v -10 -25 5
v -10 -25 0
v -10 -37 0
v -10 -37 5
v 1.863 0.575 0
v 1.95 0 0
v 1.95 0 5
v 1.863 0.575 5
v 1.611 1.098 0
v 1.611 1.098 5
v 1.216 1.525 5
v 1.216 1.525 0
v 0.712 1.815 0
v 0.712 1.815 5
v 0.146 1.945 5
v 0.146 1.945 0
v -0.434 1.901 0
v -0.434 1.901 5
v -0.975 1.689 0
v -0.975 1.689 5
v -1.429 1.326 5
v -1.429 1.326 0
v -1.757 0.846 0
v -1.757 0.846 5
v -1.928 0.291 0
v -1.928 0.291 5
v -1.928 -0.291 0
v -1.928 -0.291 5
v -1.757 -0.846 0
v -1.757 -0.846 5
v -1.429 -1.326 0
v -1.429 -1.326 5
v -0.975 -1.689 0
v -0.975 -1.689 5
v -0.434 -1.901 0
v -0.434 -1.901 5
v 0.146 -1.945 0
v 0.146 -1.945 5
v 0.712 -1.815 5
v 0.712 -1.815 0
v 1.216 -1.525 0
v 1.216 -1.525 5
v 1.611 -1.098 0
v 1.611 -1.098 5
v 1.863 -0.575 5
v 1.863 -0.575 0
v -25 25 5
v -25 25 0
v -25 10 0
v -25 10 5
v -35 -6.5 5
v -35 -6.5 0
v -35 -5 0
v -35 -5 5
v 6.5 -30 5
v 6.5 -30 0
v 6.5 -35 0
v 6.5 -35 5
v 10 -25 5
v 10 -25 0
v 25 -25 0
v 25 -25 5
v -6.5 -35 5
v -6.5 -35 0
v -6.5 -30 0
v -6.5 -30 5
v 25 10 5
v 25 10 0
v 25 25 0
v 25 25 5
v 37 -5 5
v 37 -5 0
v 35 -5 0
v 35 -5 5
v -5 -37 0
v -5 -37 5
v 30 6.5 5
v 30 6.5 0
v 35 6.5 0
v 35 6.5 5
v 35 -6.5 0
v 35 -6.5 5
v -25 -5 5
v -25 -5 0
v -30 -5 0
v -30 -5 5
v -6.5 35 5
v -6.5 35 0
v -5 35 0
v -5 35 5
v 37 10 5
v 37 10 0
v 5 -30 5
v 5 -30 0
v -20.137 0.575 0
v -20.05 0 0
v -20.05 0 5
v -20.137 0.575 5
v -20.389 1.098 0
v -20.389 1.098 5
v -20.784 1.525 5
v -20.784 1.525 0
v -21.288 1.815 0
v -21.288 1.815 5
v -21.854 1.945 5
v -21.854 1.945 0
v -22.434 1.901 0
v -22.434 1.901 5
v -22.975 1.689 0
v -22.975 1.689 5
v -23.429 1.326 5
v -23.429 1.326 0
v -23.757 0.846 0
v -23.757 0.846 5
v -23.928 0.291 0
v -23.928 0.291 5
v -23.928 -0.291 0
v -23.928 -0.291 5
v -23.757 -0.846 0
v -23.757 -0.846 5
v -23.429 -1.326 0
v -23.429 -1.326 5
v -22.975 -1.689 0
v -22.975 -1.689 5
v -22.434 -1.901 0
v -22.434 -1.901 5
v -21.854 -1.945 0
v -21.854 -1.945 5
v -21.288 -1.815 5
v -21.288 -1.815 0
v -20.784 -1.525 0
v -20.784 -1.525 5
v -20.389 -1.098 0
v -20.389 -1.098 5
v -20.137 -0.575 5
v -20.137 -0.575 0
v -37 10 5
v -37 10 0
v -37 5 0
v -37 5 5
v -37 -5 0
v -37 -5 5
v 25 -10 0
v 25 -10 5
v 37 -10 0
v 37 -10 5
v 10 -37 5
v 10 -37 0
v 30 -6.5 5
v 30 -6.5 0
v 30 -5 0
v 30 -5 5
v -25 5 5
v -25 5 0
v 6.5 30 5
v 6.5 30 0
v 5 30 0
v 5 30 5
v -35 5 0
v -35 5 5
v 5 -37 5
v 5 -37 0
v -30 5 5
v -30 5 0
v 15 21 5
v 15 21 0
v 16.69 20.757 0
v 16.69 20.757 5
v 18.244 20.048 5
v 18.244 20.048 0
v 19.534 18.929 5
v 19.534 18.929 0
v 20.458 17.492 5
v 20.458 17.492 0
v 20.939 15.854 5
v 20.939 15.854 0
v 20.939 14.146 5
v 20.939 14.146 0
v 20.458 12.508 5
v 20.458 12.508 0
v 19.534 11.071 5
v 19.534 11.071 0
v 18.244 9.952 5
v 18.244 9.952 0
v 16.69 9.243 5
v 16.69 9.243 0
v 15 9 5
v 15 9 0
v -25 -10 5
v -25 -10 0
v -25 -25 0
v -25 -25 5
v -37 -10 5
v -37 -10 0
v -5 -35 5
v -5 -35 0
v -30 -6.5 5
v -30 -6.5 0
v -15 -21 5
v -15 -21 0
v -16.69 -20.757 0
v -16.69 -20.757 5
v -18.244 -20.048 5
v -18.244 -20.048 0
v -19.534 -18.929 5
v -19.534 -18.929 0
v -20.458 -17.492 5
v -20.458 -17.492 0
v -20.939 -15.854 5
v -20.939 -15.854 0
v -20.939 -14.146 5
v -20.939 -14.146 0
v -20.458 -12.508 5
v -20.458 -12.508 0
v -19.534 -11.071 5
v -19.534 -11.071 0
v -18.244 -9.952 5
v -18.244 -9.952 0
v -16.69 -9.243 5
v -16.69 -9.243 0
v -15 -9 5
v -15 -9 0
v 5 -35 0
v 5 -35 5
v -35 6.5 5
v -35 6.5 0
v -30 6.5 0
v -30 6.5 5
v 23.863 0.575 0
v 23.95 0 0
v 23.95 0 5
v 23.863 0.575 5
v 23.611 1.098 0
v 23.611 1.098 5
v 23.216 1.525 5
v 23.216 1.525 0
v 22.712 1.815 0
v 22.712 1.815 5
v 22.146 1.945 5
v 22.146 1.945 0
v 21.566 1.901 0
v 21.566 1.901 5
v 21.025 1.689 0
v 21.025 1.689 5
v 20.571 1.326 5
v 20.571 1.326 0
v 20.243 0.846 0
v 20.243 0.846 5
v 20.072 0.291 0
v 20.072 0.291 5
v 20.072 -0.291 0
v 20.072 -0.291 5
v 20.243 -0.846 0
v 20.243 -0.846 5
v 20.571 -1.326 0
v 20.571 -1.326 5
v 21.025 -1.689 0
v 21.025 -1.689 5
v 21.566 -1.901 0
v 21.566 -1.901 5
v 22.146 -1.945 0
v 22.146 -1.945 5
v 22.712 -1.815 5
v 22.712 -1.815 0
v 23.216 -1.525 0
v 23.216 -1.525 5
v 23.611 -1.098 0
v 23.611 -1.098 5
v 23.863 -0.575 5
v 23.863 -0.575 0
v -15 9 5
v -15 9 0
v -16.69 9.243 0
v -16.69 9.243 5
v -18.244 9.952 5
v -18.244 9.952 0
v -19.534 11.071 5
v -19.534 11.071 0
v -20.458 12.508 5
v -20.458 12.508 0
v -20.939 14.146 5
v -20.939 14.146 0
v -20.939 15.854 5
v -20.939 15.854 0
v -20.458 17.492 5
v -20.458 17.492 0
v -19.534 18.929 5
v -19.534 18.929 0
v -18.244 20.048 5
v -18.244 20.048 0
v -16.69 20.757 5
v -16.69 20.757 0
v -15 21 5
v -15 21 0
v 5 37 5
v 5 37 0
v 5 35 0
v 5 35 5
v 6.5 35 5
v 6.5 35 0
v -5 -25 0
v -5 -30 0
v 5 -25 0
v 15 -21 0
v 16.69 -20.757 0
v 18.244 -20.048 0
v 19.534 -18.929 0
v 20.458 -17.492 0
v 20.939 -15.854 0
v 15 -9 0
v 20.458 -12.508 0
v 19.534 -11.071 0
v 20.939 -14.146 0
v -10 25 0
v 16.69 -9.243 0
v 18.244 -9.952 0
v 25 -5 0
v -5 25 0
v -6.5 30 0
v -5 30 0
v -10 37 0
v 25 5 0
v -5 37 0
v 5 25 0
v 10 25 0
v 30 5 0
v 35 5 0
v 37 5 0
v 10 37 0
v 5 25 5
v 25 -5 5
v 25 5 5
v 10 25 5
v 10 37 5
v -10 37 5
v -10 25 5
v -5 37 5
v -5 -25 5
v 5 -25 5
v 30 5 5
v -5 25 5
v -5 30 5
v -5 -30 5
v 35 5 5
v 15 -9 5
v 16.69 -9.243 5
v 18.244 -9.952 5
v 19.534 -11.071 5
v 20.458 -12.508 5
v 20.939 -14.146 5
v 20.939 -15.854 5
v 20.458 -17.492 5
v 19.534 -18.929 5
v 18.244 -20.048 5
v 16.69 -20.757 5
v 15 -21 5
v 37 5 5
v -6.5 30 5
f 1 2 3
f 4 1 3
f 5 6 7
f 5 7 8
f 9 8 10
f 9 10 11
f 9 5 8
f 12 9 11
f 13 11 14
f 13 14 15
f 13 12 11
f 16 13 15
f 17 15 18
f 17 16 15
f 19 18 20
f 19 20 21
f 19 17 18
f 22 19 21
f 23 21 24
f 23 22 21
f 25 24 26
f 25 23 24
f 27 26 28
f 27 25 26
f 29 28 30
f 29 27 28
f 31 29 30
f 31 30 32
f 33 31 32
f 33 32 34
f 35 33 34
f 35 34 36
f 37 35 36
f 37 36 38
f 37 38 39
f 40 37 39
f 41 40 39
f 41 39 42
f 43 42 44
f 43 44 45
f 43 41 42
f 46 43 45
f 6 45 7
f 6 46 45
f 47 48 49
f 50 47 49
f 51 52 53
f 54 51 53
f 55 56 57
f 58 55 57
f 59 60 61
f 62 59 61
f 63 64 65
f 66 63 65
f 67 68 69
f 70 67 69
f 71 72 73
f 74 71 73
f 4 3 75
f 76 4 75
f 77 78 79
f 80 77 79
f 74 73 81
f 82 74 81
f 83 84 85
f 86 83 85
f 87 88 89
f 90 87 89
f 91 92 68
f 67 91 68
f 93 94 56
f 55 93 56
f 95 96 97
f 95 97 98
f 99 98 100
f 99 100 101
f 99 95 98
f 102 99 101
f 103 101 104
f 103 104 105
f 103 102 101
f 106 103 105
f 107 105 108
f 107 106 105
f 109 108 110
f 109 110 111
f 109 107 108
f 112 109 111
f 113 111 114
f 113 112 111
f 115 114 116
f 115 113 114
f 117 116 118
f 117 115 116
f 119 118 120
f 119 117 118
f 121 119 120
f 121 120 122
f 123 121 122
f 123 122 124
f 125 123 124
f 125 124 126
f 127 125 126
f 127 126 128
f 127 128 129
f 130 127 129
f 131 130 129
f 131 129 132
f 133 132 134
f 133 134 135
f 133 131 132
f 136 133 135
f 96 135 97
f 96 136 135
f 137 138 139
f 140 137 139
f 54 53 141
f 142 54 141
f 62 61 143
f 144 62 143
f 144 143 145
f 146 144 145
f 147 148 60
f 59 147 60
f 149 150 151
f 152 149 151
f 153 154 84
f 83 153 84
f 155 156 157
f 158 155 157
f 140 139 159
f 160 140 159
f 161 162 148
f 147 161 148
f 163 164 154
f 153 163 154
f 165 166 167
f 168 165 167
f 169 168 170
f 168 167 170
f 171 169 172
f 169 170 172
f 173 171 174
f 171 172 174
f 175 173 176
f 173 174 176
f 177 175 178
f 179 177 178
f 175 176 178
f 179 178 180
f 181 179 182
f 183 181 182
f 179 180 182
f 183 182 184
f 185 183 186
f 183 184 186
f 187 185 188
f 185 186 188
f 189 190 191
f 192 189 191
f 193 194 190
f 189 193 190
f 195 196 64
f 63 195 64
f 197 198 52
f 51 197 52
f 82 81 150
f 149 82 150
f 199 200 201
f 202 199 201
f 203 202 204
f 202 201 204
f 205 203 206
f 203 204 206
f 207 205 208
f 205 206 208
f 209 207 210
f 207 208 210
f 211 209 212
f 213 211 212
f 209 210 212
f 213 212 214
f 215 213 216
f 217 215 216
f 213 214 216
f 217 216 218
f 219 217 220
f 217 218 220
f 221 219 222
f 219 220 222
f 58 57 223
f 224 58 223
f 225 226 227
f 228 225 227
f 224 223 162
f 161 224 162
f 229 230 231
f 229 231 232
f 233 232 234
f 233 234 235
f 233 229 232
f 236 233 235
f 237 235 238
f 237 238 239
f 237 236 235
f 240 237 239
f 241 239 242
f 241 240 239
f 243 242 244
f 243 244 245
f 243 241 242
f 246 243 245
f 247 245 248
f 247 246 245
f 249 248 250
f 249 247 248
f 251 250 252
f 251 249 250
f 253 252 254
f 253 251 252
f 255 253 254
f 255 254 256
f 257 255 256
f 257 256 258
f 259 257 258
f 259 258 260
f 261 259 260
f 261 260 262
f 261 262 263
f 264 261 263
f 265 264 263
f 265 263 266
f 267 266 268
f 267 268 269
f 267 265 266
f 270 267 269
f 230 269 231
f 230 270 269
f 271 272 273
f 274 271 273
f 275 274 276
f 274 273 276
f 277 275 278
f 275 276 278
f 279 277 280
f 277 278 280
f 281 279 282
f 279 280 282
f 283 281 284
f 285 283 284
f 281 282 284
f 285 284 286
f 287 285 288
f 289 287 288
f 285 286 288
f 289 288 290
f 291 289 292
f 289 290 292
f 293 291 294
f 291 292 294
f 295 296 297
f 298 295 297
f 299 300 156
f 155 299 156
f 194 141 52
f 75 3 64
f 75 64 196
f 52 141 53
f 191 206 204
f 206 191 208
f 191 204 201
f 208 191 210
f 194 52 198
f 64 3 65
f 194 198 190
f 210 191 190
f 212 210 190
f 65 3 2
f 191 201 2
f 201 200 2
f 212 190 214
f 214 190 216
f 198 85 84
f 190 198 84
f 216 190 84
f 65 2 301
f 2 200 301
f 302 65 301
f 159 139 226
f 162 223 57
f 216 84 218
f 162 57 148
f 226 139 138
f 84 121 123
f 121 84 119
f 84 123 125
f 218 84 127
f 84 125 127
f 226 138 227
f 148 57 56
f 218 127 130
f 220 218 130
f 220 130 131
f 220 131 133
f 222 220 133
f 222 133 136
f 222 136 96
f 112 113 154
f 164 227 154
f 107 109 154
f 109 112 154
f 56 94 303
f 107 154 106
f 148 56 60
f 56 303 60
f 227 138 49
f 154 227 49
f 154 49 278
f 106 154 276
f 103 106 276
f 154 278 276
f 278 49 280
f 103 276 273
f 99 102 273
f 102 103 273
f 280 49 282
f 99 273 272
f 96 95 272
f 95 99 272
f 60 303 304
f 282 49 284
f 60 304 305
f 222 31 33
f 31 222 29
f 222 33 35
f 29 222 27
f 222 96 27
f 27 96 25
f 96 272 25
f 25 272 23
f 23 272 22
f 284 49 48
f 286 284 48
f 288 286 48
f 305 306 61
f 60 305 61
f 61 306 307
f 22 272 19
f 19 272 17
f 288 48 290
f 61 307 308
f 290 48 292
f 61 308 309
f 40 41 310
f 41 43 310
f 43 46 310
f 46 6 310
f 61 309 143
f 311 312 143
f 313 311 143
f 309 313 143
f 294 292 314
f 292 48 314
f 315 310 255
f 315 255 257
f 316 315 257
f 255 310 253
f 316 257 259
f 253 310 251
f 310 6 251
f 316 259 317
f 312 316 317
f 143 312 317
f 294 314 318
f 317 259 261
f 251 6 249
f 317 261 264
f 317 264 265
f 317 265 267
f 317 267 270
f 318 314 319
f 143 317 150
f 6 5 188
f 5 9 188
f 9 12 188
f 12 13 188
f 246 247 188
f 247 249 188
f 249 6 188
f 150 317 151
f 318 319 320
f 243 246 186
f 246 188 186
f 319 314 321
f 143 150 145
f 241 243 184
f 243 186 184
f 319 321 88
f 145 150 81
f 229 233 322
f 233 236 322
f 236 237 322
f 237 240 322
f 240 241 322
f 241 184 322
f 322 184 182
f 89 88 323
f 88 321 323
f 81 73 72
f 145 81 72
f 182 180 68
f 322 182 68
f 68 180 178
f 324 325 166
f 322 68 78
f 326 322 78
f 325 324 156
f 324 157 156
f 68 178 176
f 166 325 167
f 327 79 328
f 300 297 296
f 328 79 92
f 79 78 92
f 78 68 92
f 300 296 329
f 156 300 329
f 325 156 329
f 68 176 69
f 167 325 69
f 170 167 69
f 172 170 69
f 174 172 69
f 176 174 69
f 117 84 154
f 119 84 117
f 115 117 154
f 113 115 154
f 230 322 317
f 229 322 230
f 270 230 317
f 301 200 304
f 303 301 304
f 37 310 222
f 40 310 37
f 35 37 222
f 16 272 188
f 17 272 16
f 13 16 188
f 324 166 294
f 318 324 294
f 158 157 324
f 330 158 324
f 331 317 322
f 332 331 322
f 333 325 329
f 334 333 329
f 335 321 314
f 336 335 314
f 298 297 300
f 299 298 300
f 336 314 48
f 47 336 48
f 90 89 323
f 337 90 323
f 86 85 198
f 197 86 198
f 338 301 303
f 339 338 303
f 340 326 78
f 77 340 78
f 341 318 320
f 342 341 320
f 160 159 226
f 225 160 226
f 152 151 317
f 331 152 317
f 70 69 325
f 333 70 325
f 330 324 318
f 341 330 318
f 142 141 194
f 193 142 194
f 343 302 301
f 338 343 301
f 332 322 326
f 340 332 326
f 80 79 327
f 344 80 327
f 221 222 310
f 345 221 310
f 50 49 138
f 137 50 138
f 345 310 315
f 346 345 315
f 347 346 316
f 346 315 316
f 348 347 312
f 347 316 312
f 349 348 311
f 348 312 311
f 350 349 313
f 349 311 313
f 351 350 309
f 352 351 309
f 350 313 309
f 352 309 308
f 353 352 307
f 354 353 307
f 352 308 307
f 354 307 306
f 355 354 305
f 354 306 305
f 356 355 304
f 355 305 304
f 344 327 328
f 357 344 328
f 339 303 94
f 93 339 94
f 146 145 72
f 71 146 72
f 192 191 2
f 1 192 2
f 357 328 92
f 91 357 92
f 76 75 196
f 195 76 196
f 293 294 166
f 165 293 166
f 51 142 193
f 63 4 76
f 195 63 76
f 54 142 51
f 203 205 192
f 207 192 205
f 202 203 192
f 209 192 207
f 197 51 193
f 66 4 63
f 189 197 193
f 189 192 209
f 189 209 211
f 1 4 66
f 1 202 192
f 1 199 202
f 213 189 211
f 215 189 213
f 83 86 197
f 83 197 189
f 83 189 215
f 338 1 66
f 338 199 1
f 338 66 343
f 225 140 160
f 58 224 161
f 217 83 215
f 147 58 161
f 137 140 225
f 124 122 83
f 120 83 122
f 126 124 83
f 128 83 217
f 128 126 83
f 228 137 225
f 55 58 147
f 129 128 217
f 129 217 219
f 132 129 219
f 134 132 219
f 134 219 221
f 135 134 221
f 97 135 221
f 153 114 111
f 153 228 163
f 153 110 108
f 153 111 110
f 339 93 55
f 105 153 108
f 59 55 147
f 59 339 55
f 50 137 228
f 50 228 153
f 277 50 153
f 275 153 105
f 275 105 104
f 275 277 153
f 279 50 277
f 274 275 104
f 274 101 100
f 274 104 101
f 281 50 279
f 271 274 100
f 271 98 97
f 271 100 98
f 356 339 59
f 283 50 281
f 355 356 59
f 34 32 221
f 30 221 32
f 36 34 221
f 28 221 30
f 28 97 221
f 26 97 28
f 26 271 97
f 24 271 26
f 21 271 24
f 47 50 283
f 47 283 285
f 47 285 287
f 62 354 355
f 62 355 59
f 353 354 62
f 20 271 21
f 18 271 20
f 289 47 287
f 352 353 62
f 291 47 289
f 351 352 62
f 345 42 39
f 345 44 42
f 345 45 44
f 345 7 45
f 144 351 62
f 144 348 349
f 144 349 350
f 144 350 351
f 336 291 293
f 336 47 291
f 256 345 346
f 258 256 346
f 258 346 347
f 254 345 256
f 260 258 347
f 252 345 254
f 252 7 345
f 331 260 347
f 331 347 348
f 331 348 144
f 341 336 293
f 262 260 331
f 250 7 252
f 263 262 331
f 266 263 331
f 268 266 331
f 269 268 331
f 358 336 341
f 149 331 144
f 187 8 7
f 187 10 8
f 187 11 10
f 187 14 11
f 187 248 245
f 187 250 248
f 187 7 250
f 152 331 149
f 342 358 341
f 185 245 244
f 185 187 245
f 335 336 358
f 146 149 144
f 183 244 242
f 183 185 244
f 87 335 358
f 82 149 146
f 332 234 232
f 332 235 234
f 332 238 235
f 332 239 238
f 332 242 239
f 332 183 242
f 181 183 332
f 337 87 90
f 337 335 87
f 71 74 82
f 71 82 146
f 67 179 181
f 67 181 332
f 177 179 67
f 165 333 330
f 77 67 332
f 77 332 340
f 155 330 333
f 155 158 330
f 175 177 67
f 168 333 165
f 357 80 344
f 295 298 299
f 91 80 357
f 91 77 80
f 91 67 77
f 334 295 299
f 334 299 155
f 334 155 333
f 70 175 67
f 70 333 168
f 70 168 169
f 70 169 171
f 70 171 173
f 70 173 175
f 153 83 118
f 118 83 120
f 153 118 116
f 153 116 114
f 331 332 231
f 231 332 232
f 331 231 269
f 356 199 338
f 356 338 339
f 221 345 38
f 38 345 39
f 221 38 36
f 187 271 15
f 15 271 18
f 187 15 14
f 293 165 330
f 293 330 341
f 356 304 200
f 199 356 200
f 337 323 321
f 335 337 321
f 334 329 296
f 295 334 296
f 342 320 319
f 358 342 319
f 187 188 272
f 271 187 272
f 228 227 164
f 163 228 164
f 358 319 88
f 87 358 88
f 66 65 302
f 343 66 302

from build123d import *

# Parameters (mm, degrees)
ESQUISSE1_R        = 1.95
BOSS_EXTRU_1_DEPTH = 5


with BuildPart() as part:
    # Esquisse1 → Boss.-Extru.1 (new body)
    with BuildSketch(Plane.XY):
        Polygon((-10, 25), (-25, 25), (-25, 10), (-30, 10), (-37, 10), (-37, 5), (-35, 5), (-35, 6.5), (-30, 6.5), (-30, 5), (-25, 5), (-25, 0), (-25, -5), (-30, -5), (-30, -6.5), (-35, -6.5), (-35, -5), (-37, -5), (-37, -10), (-30, -10), (-25, -10), (-25, -25), (-10, -25), (-10, -30), (-10, -37), (-5, -37), (-5, -35), (-6.5, -35), (-6.5, -30), (-5, -30), (-5, -25), (0, -25), (5, -25), (5, -30), (6.5, -30), (6.5, -35), (5, -35), (5, -37), (10, -37), (10, -30), (10, -25), (25, -25), (25, -10), (30, -10), (37, -10), (37, -5), (35, -5), (35, -6.5), (30, -6.5), (30, -5), (25, -5), (25, 0), (25, 5), (30, 5), (30, 6.5), (35, 6.5), (35, 5), (37, 5), (37, 10), (30, 10), (25, 10), (25, 25), (10, 25), (10, 30), (10, 37), (5, 37), (5, 35), (6.5, 35), (6.5, 30), (5, 30), (5, 25), (0, 25), (-5, 25), (-5, 30), (-6.5, 30), (-6.5, 35), (-5, 35), (-5, 37), (-10, 37), (-10, 30), align=None)
        with Locations((-22, 0)):
            Circle(ESQUISSE1_R, mode=Mode.SUBTRACT)
        Circle(ESQUISSE1_R, mode=Mode.SUBTRACT)
        with BuildLine():
            Line((15, -21), (-15, -21))
            ThreePointArc((-15, -21), (-21, -15), (-15, -9))
            Line((-15, -9), (15, -9))
            ThreePointArc((15, -9), (21, -15), (15, -21))
        make_face(mode=Mode.SUBTRACT)
        with Locations((22, 0)):
            Circle(ESQUISSE1_R, mode=Mode.SUBTRACT)
        with BuildLine():
            ThreePointArc((-15, 9), (-21, 15), (-15, 21))
            Line((-15, 21), (15, 21))
            ThreePointArc((15, 21), (21, 15), (15, 9))
            Line((15, 9), (-15, 9))
        make_face(mode=Mode.SUBTRACT)
    extrude(amount=BOSS_EXTRU_1_DEPTH)


solid = part.part
